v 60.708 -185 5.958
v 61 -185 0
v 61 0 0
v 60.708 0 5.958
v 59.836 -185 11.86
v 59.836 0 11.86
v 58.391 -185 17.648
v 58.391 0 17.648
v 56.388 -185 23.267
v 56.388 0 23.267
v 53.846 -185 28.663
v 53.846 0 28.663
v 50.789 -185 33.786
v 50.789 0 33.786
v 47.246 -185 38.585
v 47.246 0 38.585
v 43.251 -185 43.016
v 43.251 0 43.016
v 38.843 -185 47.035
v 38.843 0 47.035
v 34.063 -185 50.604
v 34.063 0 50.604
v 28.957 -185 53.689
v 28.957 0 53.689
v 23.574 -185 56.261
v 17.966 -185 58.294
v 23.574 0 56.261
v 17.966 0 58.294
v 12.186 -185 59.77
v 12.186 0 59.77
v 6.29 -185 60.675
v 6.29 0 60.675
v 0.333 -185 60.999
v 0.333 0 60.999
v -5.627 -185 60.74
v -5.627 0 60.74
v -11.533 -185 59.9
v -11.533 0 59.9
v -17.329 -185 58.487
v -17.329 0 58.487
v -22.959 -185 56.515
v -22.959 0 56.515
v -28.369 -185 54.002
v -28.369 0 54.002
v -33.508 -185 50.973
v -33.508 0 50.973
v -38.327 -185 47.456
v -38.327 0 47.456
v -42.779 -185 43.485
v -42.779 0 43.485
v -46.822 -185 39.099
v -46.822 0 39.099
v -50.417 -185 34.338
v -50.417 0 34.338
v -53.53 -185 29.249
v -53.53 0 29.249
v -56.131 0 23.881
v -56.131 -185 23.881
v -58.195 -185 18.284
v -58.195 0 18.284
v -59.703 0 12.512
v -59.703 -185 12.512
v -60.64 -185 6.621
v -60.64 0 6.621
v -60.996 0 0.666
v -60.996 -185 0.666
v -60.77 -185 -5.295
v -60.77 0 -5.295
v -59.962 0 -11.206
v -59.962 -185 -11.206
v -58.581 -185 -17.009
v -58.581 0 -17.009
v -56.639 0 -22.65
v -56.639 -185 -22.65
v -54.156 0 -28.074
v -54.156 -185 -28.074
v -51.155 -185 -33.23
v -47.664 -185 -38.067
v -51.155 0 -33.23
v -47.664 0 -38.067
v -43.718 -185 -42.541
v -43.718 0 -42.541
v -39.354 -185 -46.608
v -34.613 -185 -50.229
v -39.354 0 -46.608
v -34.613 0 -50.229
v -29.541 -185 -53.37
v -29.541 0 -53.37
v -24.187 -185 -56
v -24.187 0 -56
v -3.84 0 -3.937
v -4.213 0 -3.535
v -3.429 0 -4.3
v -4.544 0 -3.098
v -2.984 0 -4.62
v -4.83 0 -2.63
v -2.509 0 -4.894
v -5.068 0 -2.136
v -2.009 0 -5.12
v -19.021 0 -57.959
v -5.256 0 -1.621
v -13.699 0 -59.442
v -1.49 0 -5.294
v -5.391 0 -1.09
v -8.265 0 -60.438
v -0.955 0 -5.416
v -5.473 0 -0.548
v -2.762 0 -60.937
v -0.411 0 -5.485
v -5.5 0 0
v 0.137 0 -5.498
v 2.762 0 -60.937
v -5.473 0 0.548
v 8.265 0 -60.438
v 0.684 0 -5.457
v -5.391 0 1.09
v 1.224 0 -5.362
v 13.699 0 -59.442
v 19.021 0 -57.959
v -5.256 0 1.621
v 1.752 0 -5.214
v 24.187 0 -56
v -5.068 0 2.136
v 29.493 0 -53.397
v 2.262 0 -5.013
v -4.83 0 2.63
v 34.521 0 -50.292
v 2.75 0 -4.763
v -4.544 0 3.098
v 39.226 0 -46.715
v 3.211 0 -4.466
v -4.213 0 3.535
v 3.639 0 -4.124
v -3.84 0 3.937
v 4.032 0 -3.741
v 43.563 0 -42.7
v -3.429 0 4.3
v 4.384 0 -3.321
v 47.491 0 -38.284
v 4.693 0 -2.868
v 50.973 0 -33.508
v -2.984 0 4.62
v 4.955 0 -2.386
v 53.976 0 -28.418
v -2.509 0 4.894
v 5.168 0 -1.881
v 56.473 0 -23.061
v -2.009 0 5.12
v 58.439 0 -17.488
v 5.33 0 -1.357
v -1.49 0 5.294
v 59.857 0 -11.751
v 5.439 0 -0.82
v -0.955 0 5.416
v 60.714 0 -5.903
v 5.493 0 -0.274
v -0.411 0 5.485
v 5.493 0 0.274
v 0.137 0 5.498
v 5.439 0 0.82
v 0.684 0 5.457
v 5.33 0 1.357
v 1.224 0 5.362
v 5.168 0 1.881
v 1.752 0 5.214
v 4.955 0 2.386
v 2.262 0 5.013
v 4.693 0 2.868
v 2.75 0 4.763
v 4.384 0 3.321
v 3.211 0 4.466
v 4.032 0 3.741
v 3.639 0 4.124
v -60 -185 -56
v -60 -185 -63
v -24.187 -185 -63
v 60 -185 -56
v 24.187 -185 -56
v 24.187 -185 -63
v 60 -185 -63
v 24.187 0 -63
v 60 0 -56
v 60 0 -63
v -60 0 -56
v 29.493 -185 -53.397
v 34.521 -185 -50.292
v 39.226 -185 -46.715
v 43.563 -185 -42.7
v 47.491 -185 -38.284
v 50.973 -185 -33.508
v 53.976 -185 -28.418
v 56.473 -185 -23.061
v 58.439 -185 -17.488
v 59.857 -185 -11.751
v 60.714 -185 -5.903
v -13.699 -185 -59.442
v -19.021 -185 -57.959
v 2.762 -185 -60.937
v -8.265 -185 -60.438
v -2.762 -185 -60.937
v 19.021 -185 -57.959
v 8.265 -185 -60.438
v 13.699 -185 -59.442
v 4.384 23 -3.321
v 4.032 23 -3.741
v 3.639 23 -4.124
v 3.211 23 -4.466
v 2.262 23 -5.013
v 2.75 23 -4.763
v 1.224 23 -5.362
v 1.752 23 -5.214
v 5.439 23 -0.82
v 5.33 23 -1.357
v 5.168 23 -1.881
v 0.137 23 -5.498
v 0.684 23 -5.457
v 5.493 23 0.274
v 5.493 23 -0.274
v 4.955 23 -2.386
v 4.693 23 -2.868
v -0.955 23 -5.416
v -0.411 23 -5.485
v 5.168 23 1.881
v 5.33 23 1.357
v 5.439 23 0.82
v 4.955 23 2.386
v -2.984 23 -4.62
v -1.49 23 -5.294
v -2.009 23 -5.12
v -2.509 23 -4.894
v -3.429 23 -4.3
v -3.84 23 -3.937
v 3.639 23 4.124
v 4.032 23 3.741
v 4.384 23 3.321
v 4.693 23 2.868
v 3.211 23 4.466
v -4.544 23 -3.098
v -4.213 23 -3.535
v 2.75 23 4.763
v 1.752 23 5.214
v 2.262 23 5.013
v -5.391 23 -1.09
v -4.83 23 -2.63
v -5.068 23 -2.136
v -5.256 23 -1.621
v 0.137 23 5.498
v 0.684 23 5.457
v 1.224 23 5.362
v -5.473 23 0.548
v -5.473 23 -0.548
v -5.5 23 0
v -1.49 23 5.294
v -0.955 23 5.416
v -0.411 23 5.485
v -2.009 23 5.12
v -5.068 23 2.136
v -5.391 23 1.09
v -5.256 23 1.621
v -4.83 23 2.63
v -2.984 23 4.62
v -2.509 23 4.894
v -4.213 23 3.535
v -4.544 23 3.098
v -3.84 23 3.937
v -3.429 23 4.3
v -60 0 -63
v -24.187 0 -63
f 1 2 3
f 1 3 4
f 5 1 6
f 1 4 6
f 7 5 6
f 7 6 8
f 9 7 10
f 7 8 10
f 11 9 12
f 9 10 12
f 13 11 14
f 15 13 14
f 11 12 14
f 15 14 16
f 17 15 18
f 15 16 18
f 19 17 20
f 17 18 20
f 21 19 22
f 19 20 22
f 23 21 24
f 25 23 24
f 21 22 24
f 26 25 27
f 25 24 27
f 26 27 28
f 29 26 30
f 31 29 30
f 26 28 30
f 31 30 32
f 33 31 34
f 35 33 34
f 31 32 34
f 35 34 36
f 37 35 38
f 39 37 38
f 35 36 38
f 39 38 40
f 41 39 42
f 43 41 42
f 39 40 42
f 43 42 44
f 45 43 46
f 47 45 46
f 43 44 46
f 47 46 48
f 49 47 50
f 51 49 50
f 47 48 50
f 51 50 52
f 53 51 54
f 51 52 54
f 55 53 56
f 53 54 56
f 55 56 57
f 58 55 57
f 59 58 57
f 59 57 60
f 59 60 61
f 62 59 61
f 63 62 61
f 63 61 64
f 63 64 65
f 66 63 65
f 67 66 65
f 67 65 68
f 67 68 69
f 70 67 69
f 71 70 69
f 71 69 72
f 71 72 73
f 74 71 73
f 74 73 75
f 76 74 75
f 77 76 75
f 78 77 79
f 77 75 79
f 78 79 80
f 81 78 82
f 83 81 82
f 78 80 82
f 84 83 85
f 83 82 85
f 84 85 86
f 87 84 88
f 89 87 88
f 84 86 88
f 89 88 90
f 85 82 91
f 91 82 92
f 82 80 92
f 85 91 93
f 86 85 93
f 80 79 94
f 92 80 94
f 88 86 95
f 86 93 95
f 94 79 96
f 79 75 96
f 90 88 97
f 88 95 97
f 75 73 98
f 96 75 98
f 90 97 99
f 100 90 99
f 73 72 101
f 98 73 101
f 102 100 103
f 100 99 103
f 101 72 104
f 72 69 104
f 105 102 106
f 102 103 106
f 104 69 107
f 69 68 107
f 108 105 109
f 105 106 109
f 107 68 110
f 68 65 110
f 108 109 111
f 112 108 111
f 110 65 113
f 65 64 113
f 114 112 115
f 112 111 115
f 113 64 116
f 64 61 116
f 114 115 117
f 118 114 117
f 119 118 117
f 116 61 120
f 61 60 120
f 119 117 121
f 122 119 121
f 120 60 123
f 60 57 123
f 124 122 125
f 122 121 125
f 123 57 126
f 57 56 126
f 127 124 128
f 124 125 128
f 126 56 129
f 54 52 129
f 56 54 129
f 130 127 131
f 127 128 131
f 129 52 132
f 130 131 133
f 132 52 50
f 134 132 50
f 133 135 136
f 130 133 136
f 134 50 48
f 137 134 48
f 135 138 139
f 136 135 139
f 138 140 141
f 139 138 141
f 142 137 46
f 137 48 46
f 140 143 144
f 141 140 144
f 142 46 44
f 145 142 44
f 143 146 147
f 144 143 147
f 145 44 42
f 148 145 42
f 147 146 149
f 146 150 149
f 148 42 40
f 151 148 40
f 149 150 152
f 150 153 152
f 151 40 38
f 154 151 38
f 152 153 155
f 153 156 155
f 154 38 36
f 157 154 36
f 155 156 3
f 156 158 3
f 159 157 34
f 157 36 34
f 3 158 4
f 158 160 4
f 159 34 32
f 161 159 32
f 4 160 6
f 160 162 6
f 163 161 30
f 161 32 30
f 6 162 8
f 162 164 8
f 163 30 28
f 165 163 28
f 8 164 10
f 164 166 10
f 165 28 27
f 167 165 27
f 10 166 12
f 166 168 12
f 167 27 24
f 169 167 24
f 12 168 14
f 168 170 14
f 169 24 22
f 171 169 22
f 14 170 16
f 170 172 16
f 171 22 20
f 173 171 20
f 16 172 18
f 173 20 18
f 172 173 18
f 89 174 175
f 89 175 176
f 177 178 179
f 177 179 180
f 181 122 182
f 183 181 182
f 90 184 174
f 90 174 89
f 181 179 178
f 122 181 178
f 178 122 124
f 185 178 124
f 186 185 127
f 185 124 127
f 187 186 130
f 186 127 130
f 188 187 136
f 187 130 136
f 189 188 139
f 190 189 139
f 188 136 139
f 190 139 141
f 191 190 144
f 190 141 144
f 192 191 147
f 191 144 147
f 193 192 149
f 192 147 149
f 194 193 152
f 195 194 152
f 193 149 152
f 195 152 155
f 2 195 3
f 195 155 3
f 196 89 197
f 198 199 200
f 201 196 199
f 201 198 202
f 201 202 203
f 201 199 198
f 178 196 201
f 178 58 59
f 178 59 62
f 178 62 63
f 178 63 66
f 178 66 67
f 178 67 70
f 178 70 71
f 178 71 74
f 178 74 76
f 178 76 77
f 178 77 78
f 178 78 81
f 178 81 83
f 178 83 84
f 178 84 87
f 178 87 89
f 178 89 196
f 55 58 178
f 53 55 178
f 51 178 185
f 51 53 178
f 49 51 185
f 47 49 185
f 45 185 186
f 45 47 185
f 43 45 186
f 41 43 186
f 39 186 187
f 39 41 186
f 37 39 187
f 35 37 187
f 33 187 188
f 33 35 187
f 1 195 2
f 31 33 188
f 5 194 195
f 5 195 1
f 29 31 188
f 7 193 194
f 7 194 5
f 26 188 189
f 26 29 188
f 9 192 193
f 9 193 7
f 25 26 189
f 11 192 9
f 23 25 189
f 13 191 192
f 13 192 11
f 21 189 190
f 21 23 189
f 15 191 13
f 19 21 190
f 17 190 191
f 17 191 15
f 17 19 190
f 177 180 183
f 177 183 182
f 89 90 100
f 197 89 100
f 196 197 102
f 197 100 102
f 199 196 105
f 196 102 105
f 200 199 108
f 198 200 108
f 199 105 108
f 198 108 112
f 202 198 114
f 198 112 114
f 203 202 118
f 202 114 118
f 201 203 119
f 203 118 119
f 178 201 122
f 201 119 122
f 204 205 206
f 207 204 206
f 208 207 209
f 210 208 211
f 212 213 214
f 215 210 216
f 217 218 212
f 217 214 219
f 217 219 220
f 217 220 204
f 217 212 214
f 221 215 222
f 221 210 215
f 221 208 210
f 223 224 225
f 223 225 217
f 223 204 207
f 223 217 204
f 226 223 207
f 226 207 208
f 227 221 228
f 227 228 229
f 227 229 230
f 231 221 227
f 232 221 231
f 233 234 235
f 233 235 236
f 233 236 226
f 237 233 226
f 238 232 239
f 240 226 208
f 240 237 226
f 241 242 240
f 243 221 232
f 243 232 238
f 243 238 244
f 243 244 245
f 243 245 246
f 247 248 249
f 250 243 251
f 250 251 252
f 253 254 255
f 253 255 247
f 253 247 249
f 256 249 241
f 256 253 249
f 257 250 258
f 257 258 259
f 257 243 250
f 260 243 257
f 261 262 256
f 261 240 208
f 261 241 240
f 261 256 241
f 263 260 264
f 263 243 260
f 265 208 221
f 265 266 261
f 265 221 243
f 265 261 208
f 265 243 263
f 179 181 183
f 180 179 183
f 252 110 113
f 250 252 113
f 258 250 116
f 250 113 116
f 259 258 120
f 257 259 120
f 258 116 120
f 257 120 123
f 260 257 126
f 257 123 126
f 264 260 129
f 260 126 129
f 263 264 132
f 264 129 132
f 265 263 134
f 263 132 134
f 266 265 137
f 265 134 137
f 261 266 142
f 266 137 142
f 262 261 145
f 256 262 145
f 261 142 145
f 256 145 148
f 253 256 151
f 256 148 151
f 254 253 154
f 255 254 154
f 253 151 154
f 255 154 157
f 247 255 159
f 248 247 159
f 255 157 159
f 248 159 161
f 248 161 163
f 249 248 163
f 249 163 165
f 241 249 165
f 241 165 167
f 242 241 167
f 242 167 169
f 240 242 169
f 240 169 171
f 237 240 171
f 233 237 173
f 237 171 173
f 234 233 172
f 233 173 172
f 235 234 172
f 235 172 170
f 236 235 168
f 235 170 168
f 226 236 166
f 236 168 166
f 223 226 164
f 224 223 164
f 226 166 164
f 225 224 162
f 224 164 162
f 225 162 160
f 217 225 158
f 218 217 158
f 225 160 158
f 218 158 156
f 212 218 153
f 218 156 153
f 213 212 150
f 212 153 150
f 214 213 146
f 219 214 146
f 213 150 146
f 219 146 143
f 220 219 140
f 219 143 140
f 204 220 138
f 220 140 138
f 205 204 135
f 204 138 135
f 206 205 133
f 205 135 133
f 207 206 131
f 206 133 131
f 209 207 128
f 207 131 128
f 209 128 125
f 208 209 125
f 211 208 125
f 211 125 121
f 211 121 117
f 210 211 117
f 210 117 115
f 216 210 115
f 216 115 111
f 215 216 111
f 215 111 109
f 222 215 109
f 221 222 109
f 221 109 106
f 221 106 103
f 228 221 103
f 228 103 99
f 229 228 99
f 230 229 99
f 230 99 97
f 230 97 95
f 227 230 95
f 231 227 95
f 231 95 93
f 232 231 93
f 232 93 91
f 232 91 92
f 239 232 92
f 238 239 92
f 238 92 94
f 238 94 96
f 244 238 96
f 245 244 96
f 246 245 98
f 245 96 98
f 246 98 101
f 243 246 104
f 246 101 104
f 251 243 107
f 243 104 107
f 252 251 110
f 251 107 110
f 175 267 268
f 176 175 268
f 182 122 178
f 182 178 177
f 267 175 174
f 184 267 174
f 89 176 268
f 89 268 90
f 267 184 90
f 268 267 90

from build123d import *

# Parameters (mm, degrees)
F0_W     = 35.813227
F0_H     = 7
F1_DEPTH = 185
F2_R     = 5.5
F3_DEPTH = 23


with BuildPart() as f1:
    # F0 (on Front) → F1 (new body)
    with BuildSketch(Plane.XZ):
        with BuildLine():
            ThreePointArc((24.186773, -56), (50.972508, -33.508259), (61, 0))
            ThreePointArc((61, 0), (-33.508259, 50.972508), (-24.186773, -56))
            ThreePointArc((-24.186773, -56), (0, -61), (24.186773, -56))
        make_face()
        with Locations((42.093387, -59.5)):
            Rectangle(F0_W, F0_H)
        with Locations((-42.093387, -59.5)):
            Rectangle(F0_W, F0_H)
    extrude(amount=F1_DEPTH)

    # F2 (on face) → F3 (join)
    with BuildSketch(Plane(origin=(0, 0, 0), x_dir=(-1, 0, 0), z_dir=(0, 1, 0))):
        Circle(F2_R)
    extrude(amount=F3_DEPTH)


solid = f1.part
